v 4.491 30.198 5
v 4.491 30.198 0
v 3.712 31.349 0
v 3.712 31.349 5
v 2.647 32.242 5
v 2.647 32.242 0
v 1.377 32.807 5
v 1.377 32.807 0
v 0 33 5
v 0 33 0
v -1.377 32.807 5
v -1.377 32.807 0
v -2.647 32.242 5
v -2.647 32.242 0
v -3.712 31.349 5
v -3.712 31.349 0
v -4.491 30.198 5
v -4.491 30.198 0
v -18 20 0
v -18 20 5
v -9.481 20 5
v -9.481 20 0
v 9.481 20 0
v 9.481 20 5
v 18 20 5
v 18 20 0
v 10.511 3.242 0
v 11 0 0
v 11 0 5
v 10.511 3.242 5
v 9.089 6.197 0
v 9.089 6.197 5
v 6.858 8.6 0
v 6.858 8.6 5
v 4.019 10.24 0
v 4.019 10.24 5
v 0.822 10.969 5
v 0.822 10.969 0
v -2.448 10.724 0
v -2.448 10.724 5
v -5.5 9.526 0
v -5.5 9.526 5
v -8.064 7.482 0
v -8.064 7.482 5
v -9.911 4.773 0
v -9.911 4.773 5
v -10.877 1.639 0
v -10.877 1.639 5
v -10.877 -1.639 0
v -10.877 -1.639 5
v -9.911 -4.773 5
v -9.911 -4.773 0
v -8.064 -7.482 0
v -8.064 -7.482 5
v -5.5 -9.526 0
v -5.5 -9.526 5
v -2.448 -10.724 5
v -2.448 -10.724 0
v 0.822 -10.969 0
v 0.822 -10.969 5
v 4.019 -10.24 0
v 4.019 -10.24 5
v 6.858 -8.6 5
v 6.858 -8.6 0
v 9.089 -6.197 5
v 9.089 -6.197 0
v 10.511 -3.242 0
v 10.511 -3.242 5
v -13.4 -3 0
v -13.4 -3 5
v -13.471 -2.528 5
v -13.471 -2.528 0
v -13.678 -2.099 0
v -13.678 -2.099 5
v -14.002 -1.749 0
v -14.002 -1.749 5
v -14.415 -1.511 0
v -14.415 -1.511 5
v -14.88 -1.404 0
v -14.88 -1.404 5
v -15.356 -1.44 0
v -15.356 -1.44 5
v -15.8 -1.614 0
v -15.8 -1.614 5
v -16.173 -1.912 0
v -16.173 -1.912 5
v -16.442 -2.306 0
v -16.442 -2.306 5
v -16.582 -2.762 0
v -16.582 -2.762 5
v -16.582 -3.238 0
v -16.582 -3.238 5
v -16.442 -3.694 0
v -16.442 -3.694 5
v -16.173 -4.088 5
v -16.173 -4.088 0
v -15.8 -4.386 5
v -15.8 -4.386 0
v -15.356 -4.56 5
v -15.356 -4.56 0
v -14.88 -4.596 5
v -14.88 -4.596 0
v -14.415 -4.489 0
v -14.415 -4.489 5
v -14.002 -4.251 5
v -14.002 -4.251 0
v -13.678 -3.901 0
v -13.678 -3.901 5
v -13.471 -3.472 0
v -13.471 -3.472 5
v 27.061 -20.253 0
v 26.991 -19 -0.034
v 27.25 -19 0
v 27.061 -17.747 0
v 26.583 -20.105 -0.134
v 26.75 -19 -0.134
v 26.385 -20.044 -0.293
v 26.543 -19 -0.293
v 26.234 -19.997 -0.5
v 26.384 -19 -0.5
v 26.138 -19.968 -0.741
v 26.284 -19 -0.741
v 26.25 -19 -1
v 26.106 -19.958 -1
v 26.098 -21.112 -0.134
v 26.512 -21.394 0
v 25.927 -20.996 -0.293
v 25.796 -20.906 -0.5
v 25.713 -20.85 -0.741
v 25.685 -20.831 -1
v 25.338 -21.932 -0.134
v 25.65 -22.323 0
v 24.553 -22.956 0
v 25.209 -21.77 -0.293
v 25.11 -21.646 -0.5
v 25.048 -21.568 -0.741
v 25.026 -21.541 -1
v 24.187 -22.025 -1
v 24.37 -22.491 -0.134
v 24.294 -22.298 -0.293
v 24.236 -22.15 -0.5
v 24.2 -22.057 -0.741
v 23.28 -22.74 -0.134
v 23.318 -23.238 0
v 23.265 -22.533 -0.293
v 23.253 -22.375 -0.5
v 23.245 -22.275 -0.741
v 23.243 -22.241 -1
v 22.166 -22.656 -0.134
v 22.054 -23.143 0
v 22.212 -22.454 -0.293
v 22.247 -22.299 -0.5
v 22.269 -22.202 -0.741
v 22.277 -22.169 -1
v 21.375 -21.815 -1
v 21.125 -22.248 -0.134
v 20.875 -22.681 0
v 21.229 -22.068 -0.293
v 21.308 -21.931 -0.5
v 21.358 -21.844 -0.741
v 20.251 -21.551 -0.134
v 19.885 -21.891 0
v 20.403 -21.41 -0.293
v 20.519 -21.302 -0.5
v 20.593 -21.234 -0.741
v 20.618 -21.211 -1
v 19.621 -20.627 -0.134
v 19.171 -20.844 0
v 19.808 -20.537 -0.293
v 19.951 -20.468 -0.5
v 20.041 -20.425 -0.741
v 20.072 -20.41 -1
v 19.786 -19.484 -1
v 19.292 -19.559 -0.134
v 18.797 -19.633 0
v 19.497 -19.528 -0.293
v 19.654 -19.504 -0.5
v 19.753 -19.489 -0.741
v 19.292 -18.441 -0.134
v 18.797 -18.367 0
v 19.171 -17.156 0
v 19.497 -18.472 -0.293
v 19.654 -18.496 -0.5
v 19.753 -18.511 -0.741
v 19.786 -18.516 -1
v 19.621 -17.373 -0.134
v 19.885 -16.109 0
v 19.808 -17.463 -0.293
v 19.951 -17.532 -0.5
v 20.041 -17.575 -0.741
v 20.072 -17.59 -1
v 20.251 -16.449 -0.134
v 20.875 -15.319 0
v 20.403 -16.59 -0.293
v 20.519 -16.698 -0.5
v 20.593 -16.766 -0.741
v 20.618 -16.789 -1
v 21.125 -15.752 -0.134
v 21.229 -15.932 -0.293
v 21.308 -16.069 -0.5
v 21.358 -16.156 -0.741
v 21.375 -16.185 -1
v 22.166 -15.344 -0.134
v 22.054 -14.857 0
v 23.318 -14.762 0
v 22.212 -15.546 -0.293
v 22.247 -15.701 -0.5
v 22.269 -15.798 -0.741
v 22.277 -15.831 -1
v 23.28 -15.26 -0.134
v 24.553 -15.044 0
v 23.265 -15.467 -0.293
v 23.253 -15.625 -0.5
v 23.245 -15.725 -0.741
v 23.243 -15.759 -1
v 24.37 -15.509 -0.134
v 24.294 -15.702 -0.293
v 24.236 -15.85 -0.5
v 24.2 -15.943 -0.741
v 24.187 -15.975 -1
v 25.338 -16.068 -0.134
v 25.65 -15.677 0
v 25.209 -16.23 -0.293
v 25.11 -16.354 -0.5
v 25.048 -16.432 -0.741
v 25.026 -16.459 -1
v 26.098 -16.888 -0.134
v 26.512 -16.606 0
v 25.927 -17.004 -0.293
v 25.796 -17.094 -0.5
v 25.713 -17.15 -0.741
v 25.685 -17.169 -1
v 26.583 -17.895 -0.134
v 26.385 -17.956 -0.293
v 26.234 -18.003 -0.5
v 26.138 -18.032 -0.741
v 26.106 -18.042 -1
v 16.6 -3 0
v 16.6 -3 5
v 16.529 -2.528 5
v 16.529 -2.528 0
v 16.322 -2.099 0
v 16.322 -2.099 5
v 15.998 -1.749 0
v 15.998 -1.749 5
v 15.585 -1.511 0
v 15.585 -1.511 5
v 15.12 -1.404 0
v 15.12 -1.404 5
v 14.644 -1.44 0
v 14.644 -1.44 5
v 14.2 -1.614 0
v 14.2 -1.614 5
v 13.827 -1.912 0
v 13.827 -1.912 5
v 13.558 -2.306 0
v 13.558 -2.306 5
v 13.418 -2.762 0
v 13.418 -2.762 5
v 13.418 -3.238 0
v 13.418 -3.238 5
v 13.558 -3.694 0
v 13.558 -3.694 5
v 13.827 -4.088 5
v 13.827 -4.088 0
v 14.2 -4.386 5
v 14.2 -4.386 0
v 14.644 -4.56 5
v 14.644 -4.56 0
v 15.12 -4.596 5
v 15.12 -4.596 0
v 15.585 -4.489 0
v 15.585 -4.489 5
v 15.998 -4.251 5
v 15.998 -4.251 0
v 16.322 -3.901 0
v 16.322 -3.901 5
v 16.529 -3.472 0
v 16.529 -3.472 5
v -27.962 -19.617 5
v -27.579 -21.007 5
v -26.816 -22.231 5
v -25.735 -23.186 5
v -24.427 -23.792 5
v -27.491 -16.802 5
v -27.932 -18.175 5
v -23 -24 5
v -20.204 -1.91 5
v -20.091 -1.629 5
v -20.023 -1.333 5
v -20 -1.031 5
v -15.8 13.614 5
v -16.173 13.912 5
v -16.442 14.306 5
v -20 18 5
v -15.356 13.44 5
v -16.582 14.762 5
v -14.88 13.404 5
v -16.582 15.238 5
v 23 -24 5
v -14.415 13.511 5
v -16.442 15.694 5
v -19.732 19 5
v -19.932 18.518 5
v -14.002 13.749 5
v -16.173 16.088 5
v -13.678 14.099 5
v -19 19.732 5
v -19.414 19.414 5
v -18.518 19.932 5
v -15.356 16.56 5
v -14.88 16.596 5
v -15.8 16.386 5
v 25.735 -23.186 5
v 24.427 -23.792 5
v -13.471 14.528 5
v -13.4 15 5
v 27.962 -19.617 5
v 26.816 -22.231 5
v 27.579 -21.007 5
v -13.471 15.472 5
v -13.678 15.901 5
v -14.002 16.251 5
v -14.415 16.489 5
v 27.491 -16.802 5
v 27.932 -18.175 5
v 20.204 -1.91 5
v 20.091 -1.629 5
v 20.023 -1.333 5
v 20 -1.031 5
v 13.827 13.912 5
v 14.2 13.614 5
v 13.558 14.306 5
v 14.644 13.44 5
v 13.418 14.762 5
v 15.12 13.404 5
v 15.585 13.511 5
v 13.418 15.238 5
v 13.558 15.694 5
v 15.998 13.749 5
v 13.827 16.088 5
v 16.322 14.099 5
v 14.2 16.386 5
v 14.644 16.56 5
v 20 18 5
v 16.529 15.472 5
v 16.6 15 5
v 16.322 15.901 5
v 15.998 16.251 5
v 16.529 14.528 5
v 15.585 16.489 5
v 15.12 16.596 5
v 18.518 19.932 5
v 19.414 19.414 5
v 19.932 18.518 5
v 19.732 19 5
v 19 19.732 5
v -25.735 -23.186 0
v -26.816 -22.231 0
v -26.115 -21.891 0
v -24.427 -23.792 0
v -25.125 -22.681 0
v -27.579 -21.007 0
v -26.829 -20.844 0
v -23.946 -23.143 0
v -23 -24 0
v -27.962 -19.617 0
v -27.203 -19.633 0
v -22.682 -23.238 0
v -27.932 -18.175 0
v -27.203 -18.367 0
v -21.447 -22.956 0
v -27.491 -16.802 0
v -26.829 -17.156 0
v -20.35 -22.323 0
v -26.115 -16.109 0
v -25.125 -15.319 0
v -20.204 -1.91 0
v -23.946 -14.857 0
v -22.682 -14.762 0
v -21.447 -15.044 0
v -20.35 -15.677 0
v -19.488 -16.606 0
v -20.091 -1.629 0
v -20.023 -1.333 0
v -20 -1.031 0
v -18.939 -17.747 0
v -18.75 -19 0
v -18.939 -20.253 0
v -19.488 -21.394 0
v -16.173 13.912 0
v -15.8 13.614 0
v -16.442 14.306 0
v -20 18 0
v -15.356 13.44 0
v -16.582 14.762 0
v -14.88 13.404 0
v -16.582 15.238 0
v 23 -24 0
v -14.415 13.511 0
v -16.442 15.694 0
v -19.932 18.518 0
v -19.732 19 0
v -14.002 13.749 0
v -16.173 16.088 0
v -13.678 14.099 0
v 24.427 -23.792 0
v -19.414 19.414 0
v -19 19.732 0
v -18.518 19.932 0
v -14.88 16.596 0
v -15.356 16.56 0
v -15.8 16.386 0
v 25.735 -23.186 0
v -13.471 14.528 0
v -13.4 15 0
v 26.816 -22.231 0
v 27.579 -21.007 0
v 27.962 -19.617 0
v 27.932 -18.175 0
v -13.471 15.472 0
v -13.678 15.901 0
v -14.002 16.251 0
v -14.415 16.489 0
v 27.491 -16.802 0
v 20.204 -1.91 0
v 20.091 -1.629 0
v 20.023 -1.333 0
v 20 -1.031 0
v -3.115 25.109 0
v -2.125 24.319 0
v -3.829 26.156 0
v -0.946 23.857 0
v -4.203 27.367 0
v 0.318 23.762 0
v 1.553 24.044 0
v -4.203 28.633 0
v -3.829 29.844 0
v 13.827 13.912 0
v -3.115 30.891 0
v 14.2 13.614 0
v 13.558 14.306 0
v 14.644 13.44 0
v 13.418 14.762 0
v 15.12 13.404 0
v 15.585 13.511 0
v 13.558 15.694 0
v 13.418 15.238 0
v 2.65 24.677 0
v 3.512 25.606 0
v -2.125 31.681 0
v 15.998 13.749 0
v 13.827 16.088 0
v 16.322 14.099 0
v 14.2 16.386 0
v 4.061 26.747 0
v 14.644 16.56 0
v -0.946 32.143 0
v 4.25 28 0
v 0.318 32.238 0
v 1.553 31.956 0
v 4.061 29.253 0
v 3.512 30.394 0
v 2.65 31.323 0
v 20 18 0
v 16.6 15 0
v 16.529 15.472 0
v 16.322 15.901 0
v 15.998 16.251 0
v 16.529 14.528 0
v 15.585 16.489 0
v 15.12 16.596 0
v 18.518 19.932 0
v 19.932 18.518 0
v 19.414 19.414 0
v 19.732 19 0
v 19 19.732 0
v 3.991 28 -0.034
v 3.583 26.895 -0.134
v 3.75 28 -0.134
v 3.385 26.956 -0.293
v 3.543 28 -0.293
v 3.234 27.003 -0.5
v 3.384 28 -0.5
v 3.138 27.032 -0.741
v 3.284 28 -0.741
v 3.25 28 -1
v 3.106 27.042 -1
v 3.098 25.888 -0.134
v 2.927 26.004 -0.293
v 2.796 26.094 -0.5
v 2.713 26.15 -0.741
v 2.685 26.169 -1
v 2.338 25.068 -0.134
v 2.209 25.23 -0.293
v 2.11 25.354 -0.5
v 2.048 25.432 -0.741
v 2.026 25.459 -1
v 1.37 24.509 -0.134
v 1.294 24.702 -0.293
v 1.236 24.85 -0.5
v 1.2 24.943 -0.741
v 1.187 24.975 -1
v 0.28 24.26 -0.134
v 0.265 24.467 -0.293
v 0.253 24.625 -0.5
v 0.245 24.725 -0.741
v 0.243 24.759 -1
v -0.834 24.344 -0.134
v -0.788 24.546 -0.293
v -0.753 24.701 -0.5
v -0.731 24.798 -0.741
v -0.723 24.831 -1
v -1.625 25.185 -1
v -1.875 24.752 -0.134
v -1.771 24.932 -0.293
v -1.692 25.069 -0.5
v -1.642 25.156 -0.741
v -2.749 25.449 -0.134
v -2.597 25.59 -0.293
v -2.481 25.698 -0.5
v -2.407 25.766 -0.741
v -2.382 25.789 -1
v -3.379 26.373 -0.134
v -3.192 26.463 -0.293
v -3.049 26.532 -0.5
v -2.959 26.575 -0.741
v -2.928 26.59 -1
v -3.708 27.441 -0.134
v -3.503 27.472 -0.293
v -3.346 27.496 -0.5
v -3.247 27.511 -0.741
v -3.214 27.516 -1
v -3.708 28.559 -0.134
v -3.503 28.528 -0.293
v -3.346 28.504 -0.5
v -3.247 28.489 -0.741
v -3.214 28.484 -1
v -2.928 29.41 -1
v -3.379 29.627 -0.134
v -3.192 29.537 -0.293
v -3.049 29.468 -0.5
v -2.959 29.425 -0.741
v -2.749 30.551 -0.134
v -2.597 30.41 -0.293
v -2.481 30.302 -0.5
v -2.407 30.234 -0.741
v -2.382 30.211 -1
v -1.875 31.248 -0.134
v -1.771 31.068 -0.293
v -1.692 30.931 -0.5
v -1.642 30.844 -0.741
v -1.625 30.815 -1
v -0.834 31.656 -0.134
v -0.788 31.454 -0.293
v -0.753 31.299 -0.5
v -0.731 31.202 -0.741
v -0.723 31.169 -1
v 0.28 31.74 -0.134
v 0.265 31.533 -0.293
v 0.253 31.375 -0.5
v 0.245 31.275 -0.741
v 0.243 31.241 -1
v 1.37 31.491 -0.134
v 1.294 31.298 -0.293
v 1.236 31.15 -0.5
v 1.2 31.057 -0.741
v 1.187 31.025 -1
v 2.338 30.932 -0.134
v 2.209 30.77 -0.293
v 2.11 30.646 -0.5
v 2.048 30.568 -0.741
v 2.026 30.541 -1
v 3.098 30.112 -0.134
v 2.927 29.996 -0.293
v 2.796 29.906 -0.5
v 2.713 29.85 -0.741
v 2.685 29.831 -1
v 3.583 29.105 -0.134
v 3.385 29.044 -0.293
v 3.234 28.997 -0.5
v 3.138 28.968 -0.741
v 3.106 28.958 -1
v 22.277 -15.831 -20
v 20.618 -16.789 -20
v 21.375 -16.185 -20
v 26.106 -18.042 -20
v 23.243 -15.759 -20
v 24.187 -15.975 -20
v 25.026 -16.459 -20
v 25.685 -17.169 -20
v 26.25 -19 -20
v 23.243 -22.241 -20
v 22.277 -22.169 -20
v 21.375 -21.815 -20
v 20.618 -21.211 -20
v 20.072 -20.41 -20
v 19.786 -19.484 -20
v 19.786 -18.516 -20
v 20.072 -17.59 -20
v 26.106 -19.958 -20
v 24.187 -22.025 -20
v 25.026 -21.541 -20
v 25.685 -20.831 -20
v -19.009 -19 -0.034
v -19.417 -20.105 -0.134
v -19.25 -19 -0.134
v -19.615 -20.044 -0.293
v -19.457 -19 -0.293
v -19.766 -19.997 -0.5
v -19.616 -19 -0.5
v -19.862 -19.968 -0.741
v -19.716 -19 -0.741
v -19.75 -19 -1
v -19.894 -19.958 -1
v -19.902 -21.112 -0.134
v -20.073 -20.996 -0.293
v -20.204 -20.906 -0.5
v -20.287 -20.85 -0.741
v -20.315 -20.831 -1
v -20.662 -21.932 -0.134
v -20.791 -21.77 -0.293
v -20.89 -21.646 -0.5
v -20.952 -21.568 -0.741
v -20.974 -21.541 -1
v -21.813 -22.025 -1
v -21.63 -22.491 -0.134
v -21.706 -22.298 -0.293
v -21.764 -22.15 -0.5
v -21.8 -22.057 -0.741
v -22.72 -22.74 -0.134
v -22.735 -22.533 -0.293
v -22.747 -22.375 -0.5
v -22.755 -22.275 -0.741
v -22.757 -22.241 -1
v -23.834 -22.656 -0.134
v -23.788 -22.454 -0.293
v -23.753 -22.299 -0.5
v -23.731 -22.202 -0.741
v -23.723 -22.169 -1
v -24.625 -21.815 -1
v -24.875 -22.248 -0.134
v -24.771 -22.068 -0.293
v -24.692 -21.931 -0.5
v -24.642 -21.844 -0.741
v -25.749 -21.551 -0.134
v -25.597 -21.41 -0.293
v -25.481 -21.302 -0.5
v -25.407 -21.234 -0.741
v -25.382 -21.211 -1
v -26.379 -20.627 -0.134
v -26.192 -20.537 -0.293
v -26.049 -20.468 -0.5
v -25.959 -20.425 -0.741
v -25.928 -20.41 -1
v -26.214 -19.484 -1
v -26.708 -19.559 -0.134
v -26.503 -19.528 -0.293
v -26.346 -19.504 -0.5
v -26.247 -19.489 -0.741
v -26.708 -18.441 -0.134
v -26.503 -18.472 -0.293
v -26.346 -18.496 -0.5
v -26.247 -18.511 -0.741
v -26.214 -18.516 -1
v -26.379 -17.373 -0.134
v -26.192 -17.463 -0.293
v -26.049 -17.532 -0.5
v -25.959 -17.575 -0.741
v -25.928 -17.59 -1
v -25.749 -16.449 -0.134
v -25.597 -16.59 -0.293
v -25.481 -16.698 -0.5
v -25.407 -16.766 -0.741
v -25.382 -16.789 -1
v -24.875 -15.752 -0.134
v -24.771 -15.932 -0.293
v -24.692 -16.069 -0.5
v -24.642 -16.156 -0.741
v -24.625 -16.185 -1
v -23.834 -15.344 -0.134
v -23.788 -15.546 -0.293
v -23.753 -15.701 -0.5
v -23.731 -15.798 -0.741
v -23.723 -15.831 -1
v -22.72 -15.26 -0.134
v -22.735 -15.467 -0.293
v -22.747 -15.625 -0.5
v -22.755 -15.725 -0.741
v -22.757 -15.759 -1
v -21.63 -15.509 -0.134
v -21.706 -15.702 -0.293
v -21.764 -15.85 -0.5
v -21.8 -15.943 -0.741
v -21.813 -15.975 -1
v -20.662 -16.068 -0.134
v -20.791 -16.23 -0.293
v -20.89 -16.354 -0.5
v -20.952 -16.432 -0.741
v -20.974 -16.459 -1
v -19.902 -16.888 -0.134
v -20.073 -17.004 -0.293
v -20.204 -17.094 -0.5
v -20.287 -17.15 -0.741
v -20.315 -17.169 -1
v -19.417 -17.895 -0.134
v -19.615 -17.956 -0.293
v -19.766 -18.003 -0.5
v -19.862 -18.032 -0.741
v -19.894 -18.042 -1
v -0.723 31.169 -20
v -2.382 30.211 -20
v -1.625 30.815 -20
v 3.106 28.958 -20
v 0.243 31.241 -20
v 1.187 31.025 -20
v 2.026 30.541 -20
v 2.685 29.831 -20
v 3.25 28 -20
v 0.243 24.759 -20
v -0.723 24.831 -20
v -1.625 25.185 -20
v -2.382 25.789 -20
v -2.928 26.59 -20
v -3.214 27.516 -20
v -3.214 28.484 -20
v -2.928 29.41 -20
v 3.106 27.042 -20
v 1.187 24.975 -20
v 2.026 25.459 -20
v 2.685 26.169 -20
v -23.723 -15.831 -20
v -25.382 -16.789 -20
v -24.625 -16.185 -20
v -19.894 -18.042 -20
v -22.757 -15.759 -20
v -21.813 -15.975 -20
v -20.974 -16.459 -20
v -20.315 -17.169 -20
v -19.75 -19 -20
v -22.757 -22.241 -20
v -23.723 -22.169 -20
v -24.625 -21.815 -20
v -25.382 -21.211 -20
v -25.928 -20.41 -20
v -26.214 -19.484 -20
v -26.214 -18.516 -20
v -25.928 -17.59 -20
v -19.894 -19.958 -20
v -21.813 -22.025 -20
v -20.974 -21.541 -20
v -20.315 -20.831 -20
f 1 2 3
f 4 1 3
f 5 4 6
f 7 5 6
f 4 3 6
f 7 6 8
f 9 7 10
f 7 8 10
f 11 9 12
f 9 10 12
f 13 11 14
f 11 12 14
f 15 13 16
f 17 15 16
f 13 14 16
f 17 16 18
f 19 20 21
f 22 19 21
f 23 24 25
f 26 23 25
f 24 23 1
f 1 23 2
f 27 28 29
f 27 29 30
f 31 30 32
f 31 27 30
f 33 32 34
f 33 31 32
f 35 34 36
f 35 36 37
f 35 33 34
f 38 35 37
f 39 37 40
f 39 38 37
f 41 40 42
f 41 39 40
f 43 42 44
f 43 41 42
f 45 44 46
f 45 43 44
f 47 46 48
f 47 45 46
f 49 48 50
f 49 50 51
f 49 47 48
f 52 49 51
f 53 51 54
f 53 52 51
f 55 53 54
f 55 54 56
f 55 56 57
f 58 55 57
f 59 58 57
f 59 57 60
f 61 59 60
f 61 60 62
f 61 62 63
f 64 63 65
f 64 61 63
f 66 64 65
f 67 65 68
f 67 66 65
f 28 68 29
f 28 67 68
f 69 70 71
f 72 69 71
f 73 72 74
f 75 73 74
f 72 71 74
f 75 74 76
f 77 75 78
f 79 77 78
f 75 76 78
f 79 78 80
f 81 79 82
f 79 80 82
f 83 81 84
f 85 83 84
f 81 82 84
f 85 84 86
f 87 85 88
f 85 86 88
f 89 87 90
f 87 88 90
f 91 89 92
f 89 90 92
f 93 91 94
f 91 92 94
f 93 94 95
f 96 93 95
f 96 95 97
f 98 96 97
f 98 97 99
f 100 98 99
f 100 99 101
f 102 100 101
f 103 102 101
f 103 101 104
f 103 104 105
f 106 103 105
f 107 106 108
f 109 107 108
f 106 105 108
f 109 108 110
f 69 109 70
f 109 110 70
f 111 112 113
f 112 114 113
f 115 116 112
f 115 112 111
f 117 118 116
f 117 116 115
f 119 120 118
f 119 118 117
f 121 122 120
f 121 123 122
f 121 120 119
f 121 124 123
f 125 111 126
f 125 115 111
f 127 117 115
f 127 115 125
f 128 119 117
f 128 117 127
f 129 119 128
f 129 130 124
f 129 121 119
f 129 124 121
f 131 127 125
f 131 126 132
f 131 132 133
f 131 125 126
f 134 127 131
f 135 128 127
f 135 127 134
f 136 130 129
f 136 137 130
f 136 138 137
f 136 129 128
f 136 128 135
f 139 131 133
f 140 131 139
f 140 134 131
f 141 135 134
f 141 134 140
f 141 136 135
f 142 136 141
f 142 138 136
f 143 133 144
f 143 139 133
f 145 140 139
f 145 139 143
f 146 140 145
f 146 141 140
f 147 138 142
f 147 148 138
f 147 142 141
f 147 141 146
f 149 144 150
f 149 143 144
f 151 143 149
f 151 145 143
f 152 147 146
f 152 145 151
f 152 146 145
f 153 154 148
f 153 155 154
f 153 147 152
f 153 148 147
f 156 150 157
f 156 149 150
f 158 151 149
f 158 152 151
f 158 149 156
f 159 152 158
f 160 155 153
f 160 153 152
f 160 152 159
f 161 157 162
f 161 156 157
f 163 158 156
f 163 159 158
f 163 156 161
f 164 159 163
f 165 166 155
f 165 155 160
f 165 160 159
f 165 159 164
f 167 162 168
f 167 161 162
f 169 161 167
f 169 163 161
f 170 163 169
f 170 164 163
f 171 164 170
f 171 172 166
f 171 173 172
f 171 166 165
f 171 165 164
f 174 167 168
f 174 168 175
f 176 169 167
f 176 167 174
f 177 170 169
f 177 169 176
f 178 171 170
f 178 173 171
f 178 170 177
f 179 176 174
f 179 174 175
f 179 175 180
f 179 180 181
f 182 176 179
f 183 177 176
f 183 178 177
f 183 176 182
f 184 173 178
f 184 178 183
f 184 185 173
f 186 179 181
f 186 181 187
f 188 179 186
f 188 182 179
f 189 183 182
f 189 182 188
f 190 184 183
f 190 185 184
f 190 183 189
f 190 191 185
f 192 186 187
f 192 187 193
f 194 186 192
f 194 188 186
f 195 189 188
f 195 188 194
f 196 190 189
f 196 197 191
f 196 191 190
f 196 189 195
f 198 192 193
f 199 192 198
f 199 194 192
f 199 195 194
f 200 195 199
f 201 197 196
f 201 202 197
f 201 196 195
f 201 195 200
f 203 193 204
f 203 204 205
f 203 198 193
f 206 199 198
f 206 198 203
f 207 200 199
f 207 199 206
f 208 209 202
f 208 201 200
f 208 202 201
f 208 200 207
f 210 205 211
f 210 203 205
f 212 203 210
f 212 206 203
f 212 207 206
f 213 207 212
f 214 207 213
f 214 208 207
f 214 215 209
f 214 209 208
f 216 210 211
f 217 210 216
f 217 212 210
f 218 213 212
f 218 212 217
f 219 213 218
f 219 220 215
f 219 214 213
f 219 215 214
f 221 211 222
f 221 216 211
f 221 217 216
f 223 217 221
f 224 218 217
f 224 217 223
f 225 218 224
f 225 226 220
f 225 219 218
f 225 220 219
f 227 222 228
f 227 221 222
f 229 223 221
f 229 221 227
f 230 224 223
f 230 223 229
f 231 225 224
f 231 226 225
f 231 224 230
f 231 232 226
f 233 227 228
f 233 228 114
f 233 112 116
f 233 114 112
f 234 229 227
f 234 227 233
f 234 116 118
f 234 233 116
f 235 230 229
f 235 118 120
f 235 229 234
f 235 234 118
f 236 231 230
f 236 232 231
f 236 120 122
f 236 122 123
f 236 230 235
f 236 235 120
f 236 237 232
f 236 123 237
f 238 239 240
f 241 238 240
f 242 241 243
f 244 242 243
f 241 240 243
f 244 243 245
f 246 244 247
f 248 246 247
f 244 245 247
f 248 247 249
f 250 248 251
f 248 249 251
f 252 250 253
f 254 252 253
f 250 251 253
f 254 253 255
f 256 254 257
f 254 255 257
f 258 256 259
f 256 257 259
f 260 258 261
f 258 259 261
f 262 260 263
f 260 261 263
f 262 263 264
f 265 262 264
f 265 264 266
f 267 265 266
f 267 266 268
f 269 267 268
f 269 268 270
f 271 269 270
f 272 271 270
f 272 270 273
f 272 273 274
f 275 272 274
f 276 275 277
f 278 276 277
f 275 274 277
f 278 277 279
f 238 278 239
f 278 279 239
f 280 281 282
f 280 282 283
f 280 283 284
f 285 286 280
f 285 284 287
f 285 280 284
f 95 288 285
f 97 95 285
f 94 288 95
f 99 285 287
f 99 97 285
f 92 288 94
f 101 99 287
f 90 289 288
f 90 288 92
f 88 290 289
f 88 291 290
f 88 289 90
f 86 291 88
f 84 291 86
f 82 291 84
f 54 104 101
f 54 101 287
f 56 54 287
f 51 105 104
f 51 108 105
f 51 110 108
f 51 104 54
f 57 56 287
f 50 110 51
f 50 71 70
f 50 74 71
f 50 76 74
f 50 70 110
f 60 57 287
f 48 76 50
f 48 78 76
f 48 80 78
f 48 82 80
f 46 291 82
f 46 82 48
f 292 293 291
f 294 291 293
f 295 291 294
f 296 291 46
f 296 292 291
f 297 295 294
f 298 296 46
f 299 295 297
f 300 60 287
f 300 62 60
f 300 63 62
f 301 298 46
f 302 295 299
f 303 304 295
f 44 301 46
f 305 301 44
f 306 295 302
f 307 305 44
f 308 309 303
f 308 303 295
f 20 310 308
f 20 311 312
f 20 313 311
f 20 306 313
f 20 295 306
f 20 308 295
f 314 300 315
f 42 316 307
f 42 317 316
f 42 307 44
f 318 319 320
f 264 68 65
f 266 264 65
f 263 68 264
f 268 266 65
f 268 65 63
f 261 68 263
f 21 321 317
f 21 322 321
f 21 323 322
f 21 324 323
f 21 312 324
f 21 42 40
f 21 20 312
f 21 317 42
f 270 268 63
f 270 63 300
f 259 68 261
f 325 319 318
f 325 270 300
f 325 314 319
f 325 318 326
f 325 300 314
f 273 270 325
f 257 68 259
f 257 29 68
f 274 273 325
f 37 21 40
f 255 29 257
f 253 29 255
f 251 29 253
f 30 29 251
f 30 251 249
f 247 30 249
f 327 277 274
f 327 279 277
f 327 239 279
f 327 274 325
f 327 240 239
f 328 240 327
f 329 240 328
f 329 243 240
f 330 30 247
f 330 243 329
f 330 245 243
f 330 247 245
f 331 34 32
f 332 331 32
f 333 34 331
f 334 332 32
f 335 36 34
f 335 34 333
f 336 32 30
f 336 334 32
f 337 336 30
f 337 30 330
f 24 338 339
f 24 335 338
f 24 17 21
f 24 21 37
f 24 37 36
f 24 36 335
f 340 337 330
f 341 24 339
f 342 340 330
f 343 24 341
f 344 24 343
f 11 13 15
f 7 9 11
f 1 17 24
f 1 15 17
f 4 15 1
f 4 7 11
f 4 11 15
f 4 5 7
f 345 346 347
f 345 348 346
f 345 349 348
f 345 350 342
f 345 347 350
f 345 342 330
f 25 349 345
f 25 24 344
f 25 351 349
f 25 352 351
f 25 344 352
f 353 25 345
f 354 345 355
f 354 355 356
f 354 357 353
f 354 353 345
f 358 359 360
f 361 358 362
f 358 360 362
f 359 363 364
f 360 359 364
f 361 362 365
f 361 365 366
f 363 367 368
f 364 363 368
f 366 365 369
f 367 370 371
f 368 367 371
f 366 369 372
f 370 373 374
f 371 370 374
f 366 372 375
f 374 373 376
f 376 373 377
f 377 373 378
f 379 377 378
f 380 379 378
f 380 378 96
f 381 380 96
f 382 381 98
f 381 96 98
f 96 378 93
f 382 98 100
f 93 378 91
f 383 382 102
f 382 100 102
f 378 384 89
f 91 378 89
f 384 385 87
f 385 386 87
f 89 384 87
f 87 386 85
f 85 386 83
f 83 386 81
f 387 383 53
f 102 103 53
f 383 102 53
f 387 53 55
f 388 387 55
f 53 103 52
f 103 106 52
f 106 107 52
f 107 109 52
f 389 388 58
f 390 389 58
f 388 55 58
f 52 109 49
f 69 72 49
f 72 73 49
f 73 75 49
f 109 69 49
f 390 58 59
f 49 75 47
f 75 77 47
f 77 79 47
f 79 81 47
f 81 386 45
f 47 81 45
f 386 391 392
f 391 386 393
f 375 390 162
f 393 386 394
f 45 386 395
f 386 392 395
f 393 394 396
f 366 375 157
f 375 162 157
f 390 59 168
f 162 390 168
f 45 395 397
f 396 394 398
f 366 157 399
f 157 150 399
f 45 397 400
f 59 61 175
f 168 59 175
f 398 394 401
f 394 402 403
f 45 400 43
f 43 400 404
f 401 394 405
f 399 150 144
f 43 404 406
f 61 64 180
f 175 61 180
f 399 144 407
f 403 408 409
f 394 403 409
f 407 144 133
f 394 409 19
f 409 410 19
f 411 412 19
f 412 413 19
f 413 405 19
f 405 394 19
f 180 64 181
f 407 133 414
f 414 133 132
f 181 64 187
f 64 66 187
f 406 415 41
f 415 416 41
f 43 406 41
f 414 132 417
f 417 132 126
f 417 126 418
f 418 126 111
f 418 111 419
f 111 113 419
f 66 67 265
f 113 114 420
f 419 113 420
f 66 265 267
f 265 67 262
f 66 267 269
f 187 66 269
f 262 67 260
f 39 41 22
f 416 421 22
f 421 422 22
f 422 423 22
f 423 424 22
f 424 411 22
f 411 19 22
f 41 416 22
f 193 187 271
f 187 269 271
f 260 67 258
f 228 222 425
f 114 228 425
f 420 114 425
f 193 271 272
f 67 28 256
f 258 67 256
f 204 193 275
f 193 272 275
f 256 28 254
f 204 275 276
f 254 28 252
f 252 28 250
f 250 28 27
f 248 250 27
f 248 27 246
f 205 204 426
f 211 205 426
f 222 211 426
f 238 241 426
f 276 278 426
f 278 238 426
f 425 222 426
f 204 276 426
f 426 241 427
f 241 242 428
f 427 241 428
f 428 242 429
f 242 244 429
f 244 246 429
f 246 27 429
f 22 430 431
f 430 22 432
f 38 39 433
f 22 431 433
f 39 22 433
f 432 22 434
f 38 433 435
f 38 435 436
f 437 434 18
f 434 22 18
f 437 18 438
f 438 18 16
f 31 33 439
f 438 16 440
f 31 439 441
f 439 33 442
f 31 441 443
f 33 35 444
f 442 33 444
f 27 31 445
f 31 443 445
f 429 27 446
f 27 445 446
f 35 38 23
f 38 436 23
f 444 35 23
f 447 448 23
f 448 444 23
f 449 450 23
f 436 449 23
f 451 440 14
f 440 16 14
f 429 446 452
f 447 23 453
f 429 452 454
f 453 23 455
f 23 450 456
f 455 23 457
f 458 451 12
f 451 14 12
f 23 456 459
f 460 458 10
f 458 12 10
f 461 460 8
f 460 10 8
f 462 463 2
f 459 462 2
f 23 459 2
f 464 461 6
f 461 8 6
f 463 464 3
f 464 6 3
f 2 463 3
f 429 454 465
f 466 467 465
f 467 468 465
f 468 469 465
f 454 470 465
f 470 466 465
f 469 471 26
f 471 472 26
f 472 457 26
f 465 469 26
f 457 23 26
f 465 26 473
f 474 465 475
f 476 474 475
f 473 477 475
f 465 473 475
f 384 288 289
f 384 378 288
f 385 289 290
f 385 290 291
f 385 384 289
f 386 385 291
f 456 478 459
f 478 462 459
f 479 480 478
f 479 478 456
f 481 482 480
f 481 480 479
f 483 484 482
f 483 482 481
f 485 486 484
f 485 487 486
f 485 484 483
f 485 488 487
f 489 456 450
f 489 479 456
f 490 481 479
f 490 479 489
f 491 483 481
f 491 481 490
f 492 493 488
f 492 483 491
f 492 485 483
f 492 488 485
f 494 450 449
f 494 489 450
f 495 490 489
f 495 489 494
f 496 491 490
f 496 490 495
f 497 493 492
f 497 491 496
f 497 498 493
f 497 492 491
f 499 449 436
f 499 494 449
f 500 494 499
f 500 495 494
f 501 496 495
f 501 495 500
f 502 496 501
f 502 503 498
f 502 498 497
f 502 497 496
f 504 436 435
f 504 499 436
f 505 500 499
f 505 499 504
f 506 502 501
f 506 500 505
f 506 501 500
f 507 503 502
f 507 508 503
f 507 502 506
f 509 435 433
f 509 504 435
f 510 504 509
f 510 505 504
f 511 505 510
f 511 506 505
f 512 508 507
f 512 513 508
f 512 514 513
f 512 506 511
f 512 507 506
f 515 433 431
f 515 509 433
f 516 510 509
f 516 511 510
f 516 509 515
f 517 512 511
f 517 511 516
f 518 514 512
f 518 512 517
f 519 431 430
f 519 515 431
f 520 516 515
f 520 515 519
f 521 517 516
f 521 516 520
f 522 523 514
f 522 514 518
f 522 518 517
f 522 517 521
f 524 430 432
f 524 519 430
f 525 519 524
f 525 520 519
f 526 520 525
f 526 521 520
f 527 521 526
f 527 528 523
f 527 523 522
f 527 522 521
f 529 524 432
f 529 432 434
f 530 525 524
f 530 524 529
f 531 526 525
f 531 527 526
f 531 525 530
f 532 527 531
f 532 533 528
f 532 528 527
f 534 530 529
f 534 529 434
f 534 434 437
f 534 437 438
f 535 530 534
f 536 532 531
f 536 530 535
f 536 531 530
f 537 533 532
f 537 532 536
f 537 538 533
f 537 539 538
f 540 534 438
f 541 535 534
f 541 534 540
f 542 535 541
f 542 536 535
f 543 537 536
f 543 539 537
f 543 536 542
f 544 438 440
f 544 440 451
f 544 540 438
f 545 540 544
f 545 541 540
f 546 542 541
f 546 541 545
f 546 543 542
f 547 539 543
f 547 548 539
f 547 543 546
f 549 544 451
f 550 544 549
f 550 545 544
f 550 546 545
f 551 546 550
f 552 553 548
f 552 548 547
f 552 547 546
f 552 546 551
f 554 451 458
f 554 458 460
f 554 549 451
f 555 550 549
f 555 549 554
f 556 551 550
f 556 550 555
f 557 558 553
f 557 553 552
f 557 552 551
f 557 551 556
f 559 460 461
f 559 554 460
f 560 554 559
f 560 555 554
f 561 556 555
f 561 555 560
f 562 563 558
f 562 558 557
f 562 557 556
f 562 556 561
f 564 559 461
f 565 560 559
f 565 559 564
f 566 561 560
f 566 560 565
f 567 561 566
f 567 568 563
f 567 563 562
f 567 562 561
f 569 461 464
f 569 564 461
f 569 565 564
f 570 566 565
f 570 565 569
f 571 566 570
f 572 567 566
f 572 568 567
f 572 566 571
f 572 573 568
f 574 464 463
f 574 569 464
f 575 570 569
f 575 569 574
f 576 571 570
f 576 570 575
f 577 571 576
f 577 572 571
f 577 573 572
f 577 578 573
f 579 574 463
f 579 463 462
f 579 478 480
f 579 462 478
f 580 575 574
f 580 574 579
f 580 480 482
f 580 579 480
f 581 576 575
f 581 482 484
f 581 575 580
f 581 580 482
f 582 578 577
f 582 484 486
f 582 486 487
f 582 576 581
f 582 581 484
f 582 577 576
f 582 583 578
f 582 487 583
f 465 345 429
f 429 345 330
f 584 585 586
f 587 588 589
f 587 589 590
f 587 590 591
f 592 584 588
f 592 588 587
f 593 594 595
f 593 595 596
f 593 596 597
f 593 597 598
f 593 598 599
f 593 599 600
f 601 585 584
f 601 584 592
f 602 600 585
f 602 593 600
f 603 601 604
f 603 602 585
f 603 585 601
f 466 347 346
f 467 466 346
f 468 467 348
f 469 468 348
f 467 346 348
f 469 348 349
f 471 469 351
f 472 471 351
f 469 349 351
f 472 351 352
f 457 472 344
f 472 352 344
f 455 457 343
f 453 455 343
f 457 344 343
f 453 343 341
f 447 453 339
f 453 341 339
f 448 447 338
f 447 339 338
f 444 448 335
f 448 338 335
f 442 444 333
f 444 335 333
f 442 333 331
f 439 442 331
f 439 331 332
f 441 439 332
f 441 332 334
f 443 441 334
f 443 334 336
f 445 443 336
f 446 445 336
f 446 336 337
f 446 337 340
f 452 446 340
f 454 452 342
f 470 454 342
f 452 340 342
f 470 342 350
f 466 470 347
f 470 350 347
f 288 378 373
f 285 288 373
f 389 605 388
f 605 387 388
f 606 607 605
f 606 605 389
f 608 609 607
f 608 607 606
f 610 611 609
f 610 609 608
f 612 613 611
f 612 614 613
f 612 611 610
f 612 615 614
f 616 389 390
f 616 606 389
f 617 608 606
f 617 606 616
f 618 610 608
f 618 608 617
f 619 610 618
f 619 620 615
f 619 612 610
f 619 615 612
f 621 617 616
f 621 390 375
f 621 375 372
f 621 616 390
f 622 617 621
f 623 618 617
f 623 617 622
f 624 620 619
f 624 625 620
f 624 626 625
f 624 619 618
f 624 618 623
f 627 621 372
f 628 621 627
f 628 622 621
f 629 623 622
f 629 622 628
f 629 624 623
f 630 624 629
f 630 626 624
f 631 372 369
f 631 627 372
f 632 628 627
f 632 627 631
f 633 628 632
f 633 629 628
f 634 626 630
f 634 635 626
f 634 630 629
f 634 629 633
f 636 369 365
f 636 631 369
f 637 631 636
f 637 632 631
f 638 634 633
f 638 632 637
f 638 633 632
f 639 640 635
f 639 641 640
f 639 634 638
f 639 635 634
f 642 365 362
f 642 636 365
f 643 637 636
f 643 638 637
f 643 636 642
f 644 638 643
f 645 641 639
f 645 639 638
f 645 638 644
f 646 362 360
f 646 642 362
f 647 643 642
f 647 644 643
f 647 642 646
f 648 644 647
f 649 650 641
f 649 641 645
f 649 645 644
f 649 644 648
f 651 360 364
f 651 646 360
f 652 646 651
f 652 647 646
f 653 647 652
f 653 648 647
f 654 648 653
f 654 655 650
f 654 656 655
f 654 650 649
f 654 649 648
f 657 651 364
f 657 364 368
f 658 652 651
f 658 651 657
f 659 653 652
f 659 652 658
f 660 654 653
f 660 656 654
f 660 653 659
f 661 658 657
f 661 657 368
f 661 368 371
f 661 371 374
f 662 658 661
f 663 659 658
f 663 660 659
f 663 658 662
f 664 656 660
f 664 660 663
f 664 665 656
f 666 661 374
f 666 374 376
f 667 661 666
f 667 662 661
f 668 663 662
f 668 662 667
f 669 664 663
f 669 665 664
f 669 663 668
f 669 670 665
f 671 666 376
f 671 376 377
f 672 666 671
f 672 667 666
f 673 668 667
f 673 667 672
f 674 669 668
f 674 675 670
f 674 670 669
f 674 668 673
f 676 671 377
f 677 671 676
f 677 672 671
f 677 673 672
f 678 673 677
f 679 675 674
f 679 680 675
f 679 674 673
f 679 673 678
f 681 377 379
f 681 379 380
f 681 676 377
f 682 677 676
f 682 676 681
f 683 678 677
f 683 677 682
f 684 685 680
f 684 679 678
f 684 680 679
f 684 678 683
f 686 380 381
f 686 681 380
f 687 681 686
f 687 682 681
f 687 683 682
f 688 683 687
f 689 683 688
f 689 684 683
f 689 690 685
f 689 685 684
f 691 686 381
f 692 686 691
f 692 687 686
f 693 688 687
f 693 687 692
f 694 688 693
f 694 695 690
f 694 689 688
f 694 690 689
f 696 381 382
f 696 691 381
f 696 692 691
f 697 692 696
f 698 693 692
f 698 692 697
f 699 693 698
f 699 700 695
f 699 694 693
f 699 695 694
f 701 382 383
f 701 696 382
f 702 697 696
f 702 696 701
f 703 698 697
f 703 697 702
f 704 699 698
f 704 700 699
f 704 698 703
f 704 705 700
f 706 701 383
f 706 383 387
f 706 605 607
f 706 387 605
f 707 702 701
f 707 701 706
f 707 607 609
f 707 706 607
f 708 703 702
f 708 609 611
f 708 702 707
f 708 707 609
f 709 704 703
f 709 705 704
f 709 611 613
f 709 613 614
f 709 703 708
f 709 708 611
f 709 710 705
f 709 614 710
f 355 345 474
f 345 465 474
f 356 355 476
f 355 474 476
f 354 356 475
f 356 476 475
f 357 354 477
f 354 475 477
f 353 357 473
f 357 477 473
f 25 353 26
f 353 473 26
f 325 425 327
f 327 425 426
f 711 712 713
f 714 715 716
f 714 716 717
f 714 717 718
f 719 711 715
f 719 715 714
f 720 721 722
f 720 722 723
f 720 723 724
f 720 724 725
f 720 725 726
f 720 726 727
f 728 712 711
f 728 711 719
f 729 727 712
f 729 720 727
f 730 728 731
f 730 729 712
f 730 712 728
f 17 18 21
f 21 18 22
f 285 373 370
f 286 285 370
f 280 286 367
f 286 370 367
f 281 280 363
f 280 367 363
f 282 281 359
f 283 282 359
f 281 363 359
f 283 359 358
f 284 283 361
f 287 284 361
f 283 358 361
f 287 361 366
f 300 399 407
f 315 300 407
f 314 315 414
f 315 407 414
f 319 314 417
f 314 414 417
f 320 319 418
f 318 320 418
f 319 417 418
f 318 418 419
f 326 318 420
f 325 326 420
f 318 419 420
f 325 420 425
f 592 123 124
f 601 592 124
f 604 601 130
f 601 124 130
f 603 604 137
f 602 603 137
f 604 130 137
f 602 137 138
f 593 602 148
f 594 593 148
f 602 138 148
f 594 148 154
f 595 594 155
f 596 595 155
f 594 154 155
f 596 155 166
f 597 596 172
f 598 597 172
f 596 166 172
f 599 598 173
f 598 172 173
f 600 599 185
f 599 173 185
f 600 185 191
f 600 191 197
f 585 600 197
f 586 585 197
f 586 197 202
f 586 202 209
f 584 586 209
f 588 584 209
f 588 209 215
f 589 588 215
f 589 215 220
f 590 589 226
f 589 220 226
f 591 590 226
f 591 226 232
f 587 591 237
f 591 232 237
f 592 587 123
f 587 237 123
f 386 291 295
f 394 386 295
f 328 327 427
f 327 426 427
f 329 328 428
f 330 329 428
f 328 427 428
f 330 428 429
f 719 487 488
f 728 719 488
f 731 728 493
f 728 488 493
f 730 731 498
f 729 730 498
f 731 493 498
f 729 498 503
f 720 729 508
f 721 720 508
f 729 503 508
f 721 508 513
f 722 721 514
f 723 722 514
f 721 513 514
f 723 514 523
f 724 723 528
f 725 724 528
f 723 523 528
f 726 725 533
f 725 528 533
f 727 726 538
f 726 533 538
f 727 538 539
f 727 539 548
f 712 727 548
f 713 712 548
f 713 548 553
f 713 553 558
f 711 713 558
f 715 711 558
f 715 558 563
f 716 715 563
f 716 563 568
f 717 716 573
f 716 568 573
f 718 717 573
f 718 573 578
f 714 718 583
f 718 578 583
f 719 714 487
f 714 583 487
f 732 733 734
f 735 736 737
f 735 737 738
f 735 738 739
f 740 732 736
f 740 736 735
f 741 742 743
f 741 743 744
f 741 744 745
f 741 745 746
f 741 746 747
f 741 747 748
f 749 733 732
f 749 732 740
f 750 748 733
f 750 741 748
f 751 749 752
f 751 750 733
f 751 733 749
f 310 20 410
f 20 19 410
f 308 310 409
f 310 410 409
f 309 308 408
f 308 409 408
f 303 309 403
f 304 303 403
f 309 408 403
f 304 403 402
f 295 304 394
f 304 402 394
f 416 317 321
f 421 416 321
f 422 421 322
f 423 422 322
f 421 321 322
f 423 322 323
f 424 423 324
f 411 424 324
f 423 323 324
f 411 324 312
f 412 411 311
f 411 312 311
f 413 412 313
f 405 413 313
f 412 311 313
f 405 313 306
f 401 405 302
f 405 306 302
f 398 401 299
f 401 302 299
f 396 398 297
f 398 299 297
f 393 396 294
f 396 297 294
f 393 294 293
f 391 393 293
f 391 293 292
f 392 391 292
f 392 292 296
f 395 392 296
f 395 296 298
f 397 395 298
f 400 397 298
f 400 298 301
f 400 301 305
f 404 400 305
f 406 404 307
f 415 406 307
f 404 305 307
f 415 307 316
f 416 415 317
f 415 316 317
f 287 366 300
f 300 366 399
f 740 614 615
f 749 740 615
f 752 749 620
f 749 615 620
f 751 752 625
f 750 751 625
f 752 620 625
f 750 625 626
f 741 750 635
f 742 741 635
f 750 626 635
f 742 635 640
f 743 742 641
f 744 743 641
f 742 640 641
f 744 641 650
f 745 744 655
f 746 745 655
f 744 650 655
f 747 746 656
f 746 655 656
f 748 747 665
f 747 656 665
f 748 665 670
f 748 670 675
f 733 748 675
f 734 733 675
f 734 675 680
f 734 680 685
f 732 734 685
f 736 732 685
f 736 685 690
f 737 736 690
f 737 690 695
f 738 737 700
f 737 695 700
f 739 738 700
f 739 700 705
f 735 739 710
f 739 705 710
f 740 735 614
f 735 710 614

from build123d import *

# Parameters (mm, degrees)
SKETCH_1_R          = 11
EXTRUDE_1_DEPTH     = 5
SKETCH_2_R          = 3.25
EXTRUDE_2_DEPTH     = 20
FILLET_1_R          = 1
EXTRUDE_3_DEPTH     = 5
FILLET_2_R          = 2
SKETCH_4_R          = 1.6
CUT_EXTRUDE_1_DEPTH = 5


with BuildPart() as part:
    # 草图1 → 凸台-拉伸1 (new body)
    with BuildSketch(Plane.XY):
        with BuildLine():
            Line((-4.49108361, 30.19776432), (-27.49108361, -16.80223568))
            ThreePointArc((-27.49108361, -16.80223568), (-27.241981942, -21.64680736), (-23, -24))
            Line((-23, -24), (23, -24))
            ThreePointArc((23, -24), (27.241981942, -21.64680736), (27.49108361, -16.80223568))
            Line((27.49108361, -16.80223568), (4.49108361, 30.19776432))
            ThreePointArc((4.49108361, 30.19776432), (0, 33), (-4.49108361, 30.19776432))
        make_face()
        Circle(SKETCH_1_R, mode=Mode.SUBTRACT)
    extrude(amount=EXTRUDE_1_DEPTH)

    # 草图2 → 凸台-拉伸2 (add)
    with BuildSketch(Plane(origin=(0, 0, 0), x_dir=(-1, 0, 0), z_dir=(0, 0, -1))):
        with Locations(Location((0, 28, 0), (0, 0, 180))):
            Circle(SKETCH_2_R)
        with Locations(Location((-23, -19, 0), (0, 0, 180))):
            Circle(SKETCH_2_R)
        with Locations(Location((23, -19, 0), (0, 0, 180))):
            Circle(SKETCH_2_R)
    extrude(amount=EXTRUDE_2_DEPTH)

    # 圆角1
    fillet_1_edges = [part.edges().sort_by_distance(p)[0] for p in [
        (-3.25, 28, 0),
        (19.75, -19, 0),
        (-26.25, -19, 0),
    ]]
    fillet(fillet_1_edges, radius=FILLET_1_R)

    # 草图3 → 凸台-拉伸3 (add)
    with BuildSketch(Plane.XY.offset(5)):
        Polygon((-20, 20), (-9.481478916, 20), (-20, -1.494369172), align=None)
        Polygon((20, 20), (20, -1.494369172), (9.481478916, 20), align=None)
    extrude(amount=-EXTRUDE_3_DEPTH)

    # 圆角2
    fillet_2_edges = [part.edges().sort_by_distance(p)[0] for p in [
        (-20, -1.494369172, 2.5),
        (-20, 20, 2.5),
        (20, 20, 2.5),
        (20, -1.494369172, 2.5),
    ]]
    fillet(fillet_2_edges, radius=FILLET_2_R)

    # 草图4 → 切除-拉伸1 (cut)
    with BuildSketch(Plane.XY.offset(5)):
        with Locations((-15, 15)):
            Circle(SKETCH_4_R)
        with Locations((15, 15)):
            Circle(SKETCH_4_R)
        with Locations((15, -3)):
            Circle(SKETCH_4_R)
        with Locations((-15, -3)):
            Circle(SKETCH_4_R)
    extrude(amount=-CUT_EXTRUDE_1_DEPTH, mode=Mode.SUBTRACT)


solid = part.part
